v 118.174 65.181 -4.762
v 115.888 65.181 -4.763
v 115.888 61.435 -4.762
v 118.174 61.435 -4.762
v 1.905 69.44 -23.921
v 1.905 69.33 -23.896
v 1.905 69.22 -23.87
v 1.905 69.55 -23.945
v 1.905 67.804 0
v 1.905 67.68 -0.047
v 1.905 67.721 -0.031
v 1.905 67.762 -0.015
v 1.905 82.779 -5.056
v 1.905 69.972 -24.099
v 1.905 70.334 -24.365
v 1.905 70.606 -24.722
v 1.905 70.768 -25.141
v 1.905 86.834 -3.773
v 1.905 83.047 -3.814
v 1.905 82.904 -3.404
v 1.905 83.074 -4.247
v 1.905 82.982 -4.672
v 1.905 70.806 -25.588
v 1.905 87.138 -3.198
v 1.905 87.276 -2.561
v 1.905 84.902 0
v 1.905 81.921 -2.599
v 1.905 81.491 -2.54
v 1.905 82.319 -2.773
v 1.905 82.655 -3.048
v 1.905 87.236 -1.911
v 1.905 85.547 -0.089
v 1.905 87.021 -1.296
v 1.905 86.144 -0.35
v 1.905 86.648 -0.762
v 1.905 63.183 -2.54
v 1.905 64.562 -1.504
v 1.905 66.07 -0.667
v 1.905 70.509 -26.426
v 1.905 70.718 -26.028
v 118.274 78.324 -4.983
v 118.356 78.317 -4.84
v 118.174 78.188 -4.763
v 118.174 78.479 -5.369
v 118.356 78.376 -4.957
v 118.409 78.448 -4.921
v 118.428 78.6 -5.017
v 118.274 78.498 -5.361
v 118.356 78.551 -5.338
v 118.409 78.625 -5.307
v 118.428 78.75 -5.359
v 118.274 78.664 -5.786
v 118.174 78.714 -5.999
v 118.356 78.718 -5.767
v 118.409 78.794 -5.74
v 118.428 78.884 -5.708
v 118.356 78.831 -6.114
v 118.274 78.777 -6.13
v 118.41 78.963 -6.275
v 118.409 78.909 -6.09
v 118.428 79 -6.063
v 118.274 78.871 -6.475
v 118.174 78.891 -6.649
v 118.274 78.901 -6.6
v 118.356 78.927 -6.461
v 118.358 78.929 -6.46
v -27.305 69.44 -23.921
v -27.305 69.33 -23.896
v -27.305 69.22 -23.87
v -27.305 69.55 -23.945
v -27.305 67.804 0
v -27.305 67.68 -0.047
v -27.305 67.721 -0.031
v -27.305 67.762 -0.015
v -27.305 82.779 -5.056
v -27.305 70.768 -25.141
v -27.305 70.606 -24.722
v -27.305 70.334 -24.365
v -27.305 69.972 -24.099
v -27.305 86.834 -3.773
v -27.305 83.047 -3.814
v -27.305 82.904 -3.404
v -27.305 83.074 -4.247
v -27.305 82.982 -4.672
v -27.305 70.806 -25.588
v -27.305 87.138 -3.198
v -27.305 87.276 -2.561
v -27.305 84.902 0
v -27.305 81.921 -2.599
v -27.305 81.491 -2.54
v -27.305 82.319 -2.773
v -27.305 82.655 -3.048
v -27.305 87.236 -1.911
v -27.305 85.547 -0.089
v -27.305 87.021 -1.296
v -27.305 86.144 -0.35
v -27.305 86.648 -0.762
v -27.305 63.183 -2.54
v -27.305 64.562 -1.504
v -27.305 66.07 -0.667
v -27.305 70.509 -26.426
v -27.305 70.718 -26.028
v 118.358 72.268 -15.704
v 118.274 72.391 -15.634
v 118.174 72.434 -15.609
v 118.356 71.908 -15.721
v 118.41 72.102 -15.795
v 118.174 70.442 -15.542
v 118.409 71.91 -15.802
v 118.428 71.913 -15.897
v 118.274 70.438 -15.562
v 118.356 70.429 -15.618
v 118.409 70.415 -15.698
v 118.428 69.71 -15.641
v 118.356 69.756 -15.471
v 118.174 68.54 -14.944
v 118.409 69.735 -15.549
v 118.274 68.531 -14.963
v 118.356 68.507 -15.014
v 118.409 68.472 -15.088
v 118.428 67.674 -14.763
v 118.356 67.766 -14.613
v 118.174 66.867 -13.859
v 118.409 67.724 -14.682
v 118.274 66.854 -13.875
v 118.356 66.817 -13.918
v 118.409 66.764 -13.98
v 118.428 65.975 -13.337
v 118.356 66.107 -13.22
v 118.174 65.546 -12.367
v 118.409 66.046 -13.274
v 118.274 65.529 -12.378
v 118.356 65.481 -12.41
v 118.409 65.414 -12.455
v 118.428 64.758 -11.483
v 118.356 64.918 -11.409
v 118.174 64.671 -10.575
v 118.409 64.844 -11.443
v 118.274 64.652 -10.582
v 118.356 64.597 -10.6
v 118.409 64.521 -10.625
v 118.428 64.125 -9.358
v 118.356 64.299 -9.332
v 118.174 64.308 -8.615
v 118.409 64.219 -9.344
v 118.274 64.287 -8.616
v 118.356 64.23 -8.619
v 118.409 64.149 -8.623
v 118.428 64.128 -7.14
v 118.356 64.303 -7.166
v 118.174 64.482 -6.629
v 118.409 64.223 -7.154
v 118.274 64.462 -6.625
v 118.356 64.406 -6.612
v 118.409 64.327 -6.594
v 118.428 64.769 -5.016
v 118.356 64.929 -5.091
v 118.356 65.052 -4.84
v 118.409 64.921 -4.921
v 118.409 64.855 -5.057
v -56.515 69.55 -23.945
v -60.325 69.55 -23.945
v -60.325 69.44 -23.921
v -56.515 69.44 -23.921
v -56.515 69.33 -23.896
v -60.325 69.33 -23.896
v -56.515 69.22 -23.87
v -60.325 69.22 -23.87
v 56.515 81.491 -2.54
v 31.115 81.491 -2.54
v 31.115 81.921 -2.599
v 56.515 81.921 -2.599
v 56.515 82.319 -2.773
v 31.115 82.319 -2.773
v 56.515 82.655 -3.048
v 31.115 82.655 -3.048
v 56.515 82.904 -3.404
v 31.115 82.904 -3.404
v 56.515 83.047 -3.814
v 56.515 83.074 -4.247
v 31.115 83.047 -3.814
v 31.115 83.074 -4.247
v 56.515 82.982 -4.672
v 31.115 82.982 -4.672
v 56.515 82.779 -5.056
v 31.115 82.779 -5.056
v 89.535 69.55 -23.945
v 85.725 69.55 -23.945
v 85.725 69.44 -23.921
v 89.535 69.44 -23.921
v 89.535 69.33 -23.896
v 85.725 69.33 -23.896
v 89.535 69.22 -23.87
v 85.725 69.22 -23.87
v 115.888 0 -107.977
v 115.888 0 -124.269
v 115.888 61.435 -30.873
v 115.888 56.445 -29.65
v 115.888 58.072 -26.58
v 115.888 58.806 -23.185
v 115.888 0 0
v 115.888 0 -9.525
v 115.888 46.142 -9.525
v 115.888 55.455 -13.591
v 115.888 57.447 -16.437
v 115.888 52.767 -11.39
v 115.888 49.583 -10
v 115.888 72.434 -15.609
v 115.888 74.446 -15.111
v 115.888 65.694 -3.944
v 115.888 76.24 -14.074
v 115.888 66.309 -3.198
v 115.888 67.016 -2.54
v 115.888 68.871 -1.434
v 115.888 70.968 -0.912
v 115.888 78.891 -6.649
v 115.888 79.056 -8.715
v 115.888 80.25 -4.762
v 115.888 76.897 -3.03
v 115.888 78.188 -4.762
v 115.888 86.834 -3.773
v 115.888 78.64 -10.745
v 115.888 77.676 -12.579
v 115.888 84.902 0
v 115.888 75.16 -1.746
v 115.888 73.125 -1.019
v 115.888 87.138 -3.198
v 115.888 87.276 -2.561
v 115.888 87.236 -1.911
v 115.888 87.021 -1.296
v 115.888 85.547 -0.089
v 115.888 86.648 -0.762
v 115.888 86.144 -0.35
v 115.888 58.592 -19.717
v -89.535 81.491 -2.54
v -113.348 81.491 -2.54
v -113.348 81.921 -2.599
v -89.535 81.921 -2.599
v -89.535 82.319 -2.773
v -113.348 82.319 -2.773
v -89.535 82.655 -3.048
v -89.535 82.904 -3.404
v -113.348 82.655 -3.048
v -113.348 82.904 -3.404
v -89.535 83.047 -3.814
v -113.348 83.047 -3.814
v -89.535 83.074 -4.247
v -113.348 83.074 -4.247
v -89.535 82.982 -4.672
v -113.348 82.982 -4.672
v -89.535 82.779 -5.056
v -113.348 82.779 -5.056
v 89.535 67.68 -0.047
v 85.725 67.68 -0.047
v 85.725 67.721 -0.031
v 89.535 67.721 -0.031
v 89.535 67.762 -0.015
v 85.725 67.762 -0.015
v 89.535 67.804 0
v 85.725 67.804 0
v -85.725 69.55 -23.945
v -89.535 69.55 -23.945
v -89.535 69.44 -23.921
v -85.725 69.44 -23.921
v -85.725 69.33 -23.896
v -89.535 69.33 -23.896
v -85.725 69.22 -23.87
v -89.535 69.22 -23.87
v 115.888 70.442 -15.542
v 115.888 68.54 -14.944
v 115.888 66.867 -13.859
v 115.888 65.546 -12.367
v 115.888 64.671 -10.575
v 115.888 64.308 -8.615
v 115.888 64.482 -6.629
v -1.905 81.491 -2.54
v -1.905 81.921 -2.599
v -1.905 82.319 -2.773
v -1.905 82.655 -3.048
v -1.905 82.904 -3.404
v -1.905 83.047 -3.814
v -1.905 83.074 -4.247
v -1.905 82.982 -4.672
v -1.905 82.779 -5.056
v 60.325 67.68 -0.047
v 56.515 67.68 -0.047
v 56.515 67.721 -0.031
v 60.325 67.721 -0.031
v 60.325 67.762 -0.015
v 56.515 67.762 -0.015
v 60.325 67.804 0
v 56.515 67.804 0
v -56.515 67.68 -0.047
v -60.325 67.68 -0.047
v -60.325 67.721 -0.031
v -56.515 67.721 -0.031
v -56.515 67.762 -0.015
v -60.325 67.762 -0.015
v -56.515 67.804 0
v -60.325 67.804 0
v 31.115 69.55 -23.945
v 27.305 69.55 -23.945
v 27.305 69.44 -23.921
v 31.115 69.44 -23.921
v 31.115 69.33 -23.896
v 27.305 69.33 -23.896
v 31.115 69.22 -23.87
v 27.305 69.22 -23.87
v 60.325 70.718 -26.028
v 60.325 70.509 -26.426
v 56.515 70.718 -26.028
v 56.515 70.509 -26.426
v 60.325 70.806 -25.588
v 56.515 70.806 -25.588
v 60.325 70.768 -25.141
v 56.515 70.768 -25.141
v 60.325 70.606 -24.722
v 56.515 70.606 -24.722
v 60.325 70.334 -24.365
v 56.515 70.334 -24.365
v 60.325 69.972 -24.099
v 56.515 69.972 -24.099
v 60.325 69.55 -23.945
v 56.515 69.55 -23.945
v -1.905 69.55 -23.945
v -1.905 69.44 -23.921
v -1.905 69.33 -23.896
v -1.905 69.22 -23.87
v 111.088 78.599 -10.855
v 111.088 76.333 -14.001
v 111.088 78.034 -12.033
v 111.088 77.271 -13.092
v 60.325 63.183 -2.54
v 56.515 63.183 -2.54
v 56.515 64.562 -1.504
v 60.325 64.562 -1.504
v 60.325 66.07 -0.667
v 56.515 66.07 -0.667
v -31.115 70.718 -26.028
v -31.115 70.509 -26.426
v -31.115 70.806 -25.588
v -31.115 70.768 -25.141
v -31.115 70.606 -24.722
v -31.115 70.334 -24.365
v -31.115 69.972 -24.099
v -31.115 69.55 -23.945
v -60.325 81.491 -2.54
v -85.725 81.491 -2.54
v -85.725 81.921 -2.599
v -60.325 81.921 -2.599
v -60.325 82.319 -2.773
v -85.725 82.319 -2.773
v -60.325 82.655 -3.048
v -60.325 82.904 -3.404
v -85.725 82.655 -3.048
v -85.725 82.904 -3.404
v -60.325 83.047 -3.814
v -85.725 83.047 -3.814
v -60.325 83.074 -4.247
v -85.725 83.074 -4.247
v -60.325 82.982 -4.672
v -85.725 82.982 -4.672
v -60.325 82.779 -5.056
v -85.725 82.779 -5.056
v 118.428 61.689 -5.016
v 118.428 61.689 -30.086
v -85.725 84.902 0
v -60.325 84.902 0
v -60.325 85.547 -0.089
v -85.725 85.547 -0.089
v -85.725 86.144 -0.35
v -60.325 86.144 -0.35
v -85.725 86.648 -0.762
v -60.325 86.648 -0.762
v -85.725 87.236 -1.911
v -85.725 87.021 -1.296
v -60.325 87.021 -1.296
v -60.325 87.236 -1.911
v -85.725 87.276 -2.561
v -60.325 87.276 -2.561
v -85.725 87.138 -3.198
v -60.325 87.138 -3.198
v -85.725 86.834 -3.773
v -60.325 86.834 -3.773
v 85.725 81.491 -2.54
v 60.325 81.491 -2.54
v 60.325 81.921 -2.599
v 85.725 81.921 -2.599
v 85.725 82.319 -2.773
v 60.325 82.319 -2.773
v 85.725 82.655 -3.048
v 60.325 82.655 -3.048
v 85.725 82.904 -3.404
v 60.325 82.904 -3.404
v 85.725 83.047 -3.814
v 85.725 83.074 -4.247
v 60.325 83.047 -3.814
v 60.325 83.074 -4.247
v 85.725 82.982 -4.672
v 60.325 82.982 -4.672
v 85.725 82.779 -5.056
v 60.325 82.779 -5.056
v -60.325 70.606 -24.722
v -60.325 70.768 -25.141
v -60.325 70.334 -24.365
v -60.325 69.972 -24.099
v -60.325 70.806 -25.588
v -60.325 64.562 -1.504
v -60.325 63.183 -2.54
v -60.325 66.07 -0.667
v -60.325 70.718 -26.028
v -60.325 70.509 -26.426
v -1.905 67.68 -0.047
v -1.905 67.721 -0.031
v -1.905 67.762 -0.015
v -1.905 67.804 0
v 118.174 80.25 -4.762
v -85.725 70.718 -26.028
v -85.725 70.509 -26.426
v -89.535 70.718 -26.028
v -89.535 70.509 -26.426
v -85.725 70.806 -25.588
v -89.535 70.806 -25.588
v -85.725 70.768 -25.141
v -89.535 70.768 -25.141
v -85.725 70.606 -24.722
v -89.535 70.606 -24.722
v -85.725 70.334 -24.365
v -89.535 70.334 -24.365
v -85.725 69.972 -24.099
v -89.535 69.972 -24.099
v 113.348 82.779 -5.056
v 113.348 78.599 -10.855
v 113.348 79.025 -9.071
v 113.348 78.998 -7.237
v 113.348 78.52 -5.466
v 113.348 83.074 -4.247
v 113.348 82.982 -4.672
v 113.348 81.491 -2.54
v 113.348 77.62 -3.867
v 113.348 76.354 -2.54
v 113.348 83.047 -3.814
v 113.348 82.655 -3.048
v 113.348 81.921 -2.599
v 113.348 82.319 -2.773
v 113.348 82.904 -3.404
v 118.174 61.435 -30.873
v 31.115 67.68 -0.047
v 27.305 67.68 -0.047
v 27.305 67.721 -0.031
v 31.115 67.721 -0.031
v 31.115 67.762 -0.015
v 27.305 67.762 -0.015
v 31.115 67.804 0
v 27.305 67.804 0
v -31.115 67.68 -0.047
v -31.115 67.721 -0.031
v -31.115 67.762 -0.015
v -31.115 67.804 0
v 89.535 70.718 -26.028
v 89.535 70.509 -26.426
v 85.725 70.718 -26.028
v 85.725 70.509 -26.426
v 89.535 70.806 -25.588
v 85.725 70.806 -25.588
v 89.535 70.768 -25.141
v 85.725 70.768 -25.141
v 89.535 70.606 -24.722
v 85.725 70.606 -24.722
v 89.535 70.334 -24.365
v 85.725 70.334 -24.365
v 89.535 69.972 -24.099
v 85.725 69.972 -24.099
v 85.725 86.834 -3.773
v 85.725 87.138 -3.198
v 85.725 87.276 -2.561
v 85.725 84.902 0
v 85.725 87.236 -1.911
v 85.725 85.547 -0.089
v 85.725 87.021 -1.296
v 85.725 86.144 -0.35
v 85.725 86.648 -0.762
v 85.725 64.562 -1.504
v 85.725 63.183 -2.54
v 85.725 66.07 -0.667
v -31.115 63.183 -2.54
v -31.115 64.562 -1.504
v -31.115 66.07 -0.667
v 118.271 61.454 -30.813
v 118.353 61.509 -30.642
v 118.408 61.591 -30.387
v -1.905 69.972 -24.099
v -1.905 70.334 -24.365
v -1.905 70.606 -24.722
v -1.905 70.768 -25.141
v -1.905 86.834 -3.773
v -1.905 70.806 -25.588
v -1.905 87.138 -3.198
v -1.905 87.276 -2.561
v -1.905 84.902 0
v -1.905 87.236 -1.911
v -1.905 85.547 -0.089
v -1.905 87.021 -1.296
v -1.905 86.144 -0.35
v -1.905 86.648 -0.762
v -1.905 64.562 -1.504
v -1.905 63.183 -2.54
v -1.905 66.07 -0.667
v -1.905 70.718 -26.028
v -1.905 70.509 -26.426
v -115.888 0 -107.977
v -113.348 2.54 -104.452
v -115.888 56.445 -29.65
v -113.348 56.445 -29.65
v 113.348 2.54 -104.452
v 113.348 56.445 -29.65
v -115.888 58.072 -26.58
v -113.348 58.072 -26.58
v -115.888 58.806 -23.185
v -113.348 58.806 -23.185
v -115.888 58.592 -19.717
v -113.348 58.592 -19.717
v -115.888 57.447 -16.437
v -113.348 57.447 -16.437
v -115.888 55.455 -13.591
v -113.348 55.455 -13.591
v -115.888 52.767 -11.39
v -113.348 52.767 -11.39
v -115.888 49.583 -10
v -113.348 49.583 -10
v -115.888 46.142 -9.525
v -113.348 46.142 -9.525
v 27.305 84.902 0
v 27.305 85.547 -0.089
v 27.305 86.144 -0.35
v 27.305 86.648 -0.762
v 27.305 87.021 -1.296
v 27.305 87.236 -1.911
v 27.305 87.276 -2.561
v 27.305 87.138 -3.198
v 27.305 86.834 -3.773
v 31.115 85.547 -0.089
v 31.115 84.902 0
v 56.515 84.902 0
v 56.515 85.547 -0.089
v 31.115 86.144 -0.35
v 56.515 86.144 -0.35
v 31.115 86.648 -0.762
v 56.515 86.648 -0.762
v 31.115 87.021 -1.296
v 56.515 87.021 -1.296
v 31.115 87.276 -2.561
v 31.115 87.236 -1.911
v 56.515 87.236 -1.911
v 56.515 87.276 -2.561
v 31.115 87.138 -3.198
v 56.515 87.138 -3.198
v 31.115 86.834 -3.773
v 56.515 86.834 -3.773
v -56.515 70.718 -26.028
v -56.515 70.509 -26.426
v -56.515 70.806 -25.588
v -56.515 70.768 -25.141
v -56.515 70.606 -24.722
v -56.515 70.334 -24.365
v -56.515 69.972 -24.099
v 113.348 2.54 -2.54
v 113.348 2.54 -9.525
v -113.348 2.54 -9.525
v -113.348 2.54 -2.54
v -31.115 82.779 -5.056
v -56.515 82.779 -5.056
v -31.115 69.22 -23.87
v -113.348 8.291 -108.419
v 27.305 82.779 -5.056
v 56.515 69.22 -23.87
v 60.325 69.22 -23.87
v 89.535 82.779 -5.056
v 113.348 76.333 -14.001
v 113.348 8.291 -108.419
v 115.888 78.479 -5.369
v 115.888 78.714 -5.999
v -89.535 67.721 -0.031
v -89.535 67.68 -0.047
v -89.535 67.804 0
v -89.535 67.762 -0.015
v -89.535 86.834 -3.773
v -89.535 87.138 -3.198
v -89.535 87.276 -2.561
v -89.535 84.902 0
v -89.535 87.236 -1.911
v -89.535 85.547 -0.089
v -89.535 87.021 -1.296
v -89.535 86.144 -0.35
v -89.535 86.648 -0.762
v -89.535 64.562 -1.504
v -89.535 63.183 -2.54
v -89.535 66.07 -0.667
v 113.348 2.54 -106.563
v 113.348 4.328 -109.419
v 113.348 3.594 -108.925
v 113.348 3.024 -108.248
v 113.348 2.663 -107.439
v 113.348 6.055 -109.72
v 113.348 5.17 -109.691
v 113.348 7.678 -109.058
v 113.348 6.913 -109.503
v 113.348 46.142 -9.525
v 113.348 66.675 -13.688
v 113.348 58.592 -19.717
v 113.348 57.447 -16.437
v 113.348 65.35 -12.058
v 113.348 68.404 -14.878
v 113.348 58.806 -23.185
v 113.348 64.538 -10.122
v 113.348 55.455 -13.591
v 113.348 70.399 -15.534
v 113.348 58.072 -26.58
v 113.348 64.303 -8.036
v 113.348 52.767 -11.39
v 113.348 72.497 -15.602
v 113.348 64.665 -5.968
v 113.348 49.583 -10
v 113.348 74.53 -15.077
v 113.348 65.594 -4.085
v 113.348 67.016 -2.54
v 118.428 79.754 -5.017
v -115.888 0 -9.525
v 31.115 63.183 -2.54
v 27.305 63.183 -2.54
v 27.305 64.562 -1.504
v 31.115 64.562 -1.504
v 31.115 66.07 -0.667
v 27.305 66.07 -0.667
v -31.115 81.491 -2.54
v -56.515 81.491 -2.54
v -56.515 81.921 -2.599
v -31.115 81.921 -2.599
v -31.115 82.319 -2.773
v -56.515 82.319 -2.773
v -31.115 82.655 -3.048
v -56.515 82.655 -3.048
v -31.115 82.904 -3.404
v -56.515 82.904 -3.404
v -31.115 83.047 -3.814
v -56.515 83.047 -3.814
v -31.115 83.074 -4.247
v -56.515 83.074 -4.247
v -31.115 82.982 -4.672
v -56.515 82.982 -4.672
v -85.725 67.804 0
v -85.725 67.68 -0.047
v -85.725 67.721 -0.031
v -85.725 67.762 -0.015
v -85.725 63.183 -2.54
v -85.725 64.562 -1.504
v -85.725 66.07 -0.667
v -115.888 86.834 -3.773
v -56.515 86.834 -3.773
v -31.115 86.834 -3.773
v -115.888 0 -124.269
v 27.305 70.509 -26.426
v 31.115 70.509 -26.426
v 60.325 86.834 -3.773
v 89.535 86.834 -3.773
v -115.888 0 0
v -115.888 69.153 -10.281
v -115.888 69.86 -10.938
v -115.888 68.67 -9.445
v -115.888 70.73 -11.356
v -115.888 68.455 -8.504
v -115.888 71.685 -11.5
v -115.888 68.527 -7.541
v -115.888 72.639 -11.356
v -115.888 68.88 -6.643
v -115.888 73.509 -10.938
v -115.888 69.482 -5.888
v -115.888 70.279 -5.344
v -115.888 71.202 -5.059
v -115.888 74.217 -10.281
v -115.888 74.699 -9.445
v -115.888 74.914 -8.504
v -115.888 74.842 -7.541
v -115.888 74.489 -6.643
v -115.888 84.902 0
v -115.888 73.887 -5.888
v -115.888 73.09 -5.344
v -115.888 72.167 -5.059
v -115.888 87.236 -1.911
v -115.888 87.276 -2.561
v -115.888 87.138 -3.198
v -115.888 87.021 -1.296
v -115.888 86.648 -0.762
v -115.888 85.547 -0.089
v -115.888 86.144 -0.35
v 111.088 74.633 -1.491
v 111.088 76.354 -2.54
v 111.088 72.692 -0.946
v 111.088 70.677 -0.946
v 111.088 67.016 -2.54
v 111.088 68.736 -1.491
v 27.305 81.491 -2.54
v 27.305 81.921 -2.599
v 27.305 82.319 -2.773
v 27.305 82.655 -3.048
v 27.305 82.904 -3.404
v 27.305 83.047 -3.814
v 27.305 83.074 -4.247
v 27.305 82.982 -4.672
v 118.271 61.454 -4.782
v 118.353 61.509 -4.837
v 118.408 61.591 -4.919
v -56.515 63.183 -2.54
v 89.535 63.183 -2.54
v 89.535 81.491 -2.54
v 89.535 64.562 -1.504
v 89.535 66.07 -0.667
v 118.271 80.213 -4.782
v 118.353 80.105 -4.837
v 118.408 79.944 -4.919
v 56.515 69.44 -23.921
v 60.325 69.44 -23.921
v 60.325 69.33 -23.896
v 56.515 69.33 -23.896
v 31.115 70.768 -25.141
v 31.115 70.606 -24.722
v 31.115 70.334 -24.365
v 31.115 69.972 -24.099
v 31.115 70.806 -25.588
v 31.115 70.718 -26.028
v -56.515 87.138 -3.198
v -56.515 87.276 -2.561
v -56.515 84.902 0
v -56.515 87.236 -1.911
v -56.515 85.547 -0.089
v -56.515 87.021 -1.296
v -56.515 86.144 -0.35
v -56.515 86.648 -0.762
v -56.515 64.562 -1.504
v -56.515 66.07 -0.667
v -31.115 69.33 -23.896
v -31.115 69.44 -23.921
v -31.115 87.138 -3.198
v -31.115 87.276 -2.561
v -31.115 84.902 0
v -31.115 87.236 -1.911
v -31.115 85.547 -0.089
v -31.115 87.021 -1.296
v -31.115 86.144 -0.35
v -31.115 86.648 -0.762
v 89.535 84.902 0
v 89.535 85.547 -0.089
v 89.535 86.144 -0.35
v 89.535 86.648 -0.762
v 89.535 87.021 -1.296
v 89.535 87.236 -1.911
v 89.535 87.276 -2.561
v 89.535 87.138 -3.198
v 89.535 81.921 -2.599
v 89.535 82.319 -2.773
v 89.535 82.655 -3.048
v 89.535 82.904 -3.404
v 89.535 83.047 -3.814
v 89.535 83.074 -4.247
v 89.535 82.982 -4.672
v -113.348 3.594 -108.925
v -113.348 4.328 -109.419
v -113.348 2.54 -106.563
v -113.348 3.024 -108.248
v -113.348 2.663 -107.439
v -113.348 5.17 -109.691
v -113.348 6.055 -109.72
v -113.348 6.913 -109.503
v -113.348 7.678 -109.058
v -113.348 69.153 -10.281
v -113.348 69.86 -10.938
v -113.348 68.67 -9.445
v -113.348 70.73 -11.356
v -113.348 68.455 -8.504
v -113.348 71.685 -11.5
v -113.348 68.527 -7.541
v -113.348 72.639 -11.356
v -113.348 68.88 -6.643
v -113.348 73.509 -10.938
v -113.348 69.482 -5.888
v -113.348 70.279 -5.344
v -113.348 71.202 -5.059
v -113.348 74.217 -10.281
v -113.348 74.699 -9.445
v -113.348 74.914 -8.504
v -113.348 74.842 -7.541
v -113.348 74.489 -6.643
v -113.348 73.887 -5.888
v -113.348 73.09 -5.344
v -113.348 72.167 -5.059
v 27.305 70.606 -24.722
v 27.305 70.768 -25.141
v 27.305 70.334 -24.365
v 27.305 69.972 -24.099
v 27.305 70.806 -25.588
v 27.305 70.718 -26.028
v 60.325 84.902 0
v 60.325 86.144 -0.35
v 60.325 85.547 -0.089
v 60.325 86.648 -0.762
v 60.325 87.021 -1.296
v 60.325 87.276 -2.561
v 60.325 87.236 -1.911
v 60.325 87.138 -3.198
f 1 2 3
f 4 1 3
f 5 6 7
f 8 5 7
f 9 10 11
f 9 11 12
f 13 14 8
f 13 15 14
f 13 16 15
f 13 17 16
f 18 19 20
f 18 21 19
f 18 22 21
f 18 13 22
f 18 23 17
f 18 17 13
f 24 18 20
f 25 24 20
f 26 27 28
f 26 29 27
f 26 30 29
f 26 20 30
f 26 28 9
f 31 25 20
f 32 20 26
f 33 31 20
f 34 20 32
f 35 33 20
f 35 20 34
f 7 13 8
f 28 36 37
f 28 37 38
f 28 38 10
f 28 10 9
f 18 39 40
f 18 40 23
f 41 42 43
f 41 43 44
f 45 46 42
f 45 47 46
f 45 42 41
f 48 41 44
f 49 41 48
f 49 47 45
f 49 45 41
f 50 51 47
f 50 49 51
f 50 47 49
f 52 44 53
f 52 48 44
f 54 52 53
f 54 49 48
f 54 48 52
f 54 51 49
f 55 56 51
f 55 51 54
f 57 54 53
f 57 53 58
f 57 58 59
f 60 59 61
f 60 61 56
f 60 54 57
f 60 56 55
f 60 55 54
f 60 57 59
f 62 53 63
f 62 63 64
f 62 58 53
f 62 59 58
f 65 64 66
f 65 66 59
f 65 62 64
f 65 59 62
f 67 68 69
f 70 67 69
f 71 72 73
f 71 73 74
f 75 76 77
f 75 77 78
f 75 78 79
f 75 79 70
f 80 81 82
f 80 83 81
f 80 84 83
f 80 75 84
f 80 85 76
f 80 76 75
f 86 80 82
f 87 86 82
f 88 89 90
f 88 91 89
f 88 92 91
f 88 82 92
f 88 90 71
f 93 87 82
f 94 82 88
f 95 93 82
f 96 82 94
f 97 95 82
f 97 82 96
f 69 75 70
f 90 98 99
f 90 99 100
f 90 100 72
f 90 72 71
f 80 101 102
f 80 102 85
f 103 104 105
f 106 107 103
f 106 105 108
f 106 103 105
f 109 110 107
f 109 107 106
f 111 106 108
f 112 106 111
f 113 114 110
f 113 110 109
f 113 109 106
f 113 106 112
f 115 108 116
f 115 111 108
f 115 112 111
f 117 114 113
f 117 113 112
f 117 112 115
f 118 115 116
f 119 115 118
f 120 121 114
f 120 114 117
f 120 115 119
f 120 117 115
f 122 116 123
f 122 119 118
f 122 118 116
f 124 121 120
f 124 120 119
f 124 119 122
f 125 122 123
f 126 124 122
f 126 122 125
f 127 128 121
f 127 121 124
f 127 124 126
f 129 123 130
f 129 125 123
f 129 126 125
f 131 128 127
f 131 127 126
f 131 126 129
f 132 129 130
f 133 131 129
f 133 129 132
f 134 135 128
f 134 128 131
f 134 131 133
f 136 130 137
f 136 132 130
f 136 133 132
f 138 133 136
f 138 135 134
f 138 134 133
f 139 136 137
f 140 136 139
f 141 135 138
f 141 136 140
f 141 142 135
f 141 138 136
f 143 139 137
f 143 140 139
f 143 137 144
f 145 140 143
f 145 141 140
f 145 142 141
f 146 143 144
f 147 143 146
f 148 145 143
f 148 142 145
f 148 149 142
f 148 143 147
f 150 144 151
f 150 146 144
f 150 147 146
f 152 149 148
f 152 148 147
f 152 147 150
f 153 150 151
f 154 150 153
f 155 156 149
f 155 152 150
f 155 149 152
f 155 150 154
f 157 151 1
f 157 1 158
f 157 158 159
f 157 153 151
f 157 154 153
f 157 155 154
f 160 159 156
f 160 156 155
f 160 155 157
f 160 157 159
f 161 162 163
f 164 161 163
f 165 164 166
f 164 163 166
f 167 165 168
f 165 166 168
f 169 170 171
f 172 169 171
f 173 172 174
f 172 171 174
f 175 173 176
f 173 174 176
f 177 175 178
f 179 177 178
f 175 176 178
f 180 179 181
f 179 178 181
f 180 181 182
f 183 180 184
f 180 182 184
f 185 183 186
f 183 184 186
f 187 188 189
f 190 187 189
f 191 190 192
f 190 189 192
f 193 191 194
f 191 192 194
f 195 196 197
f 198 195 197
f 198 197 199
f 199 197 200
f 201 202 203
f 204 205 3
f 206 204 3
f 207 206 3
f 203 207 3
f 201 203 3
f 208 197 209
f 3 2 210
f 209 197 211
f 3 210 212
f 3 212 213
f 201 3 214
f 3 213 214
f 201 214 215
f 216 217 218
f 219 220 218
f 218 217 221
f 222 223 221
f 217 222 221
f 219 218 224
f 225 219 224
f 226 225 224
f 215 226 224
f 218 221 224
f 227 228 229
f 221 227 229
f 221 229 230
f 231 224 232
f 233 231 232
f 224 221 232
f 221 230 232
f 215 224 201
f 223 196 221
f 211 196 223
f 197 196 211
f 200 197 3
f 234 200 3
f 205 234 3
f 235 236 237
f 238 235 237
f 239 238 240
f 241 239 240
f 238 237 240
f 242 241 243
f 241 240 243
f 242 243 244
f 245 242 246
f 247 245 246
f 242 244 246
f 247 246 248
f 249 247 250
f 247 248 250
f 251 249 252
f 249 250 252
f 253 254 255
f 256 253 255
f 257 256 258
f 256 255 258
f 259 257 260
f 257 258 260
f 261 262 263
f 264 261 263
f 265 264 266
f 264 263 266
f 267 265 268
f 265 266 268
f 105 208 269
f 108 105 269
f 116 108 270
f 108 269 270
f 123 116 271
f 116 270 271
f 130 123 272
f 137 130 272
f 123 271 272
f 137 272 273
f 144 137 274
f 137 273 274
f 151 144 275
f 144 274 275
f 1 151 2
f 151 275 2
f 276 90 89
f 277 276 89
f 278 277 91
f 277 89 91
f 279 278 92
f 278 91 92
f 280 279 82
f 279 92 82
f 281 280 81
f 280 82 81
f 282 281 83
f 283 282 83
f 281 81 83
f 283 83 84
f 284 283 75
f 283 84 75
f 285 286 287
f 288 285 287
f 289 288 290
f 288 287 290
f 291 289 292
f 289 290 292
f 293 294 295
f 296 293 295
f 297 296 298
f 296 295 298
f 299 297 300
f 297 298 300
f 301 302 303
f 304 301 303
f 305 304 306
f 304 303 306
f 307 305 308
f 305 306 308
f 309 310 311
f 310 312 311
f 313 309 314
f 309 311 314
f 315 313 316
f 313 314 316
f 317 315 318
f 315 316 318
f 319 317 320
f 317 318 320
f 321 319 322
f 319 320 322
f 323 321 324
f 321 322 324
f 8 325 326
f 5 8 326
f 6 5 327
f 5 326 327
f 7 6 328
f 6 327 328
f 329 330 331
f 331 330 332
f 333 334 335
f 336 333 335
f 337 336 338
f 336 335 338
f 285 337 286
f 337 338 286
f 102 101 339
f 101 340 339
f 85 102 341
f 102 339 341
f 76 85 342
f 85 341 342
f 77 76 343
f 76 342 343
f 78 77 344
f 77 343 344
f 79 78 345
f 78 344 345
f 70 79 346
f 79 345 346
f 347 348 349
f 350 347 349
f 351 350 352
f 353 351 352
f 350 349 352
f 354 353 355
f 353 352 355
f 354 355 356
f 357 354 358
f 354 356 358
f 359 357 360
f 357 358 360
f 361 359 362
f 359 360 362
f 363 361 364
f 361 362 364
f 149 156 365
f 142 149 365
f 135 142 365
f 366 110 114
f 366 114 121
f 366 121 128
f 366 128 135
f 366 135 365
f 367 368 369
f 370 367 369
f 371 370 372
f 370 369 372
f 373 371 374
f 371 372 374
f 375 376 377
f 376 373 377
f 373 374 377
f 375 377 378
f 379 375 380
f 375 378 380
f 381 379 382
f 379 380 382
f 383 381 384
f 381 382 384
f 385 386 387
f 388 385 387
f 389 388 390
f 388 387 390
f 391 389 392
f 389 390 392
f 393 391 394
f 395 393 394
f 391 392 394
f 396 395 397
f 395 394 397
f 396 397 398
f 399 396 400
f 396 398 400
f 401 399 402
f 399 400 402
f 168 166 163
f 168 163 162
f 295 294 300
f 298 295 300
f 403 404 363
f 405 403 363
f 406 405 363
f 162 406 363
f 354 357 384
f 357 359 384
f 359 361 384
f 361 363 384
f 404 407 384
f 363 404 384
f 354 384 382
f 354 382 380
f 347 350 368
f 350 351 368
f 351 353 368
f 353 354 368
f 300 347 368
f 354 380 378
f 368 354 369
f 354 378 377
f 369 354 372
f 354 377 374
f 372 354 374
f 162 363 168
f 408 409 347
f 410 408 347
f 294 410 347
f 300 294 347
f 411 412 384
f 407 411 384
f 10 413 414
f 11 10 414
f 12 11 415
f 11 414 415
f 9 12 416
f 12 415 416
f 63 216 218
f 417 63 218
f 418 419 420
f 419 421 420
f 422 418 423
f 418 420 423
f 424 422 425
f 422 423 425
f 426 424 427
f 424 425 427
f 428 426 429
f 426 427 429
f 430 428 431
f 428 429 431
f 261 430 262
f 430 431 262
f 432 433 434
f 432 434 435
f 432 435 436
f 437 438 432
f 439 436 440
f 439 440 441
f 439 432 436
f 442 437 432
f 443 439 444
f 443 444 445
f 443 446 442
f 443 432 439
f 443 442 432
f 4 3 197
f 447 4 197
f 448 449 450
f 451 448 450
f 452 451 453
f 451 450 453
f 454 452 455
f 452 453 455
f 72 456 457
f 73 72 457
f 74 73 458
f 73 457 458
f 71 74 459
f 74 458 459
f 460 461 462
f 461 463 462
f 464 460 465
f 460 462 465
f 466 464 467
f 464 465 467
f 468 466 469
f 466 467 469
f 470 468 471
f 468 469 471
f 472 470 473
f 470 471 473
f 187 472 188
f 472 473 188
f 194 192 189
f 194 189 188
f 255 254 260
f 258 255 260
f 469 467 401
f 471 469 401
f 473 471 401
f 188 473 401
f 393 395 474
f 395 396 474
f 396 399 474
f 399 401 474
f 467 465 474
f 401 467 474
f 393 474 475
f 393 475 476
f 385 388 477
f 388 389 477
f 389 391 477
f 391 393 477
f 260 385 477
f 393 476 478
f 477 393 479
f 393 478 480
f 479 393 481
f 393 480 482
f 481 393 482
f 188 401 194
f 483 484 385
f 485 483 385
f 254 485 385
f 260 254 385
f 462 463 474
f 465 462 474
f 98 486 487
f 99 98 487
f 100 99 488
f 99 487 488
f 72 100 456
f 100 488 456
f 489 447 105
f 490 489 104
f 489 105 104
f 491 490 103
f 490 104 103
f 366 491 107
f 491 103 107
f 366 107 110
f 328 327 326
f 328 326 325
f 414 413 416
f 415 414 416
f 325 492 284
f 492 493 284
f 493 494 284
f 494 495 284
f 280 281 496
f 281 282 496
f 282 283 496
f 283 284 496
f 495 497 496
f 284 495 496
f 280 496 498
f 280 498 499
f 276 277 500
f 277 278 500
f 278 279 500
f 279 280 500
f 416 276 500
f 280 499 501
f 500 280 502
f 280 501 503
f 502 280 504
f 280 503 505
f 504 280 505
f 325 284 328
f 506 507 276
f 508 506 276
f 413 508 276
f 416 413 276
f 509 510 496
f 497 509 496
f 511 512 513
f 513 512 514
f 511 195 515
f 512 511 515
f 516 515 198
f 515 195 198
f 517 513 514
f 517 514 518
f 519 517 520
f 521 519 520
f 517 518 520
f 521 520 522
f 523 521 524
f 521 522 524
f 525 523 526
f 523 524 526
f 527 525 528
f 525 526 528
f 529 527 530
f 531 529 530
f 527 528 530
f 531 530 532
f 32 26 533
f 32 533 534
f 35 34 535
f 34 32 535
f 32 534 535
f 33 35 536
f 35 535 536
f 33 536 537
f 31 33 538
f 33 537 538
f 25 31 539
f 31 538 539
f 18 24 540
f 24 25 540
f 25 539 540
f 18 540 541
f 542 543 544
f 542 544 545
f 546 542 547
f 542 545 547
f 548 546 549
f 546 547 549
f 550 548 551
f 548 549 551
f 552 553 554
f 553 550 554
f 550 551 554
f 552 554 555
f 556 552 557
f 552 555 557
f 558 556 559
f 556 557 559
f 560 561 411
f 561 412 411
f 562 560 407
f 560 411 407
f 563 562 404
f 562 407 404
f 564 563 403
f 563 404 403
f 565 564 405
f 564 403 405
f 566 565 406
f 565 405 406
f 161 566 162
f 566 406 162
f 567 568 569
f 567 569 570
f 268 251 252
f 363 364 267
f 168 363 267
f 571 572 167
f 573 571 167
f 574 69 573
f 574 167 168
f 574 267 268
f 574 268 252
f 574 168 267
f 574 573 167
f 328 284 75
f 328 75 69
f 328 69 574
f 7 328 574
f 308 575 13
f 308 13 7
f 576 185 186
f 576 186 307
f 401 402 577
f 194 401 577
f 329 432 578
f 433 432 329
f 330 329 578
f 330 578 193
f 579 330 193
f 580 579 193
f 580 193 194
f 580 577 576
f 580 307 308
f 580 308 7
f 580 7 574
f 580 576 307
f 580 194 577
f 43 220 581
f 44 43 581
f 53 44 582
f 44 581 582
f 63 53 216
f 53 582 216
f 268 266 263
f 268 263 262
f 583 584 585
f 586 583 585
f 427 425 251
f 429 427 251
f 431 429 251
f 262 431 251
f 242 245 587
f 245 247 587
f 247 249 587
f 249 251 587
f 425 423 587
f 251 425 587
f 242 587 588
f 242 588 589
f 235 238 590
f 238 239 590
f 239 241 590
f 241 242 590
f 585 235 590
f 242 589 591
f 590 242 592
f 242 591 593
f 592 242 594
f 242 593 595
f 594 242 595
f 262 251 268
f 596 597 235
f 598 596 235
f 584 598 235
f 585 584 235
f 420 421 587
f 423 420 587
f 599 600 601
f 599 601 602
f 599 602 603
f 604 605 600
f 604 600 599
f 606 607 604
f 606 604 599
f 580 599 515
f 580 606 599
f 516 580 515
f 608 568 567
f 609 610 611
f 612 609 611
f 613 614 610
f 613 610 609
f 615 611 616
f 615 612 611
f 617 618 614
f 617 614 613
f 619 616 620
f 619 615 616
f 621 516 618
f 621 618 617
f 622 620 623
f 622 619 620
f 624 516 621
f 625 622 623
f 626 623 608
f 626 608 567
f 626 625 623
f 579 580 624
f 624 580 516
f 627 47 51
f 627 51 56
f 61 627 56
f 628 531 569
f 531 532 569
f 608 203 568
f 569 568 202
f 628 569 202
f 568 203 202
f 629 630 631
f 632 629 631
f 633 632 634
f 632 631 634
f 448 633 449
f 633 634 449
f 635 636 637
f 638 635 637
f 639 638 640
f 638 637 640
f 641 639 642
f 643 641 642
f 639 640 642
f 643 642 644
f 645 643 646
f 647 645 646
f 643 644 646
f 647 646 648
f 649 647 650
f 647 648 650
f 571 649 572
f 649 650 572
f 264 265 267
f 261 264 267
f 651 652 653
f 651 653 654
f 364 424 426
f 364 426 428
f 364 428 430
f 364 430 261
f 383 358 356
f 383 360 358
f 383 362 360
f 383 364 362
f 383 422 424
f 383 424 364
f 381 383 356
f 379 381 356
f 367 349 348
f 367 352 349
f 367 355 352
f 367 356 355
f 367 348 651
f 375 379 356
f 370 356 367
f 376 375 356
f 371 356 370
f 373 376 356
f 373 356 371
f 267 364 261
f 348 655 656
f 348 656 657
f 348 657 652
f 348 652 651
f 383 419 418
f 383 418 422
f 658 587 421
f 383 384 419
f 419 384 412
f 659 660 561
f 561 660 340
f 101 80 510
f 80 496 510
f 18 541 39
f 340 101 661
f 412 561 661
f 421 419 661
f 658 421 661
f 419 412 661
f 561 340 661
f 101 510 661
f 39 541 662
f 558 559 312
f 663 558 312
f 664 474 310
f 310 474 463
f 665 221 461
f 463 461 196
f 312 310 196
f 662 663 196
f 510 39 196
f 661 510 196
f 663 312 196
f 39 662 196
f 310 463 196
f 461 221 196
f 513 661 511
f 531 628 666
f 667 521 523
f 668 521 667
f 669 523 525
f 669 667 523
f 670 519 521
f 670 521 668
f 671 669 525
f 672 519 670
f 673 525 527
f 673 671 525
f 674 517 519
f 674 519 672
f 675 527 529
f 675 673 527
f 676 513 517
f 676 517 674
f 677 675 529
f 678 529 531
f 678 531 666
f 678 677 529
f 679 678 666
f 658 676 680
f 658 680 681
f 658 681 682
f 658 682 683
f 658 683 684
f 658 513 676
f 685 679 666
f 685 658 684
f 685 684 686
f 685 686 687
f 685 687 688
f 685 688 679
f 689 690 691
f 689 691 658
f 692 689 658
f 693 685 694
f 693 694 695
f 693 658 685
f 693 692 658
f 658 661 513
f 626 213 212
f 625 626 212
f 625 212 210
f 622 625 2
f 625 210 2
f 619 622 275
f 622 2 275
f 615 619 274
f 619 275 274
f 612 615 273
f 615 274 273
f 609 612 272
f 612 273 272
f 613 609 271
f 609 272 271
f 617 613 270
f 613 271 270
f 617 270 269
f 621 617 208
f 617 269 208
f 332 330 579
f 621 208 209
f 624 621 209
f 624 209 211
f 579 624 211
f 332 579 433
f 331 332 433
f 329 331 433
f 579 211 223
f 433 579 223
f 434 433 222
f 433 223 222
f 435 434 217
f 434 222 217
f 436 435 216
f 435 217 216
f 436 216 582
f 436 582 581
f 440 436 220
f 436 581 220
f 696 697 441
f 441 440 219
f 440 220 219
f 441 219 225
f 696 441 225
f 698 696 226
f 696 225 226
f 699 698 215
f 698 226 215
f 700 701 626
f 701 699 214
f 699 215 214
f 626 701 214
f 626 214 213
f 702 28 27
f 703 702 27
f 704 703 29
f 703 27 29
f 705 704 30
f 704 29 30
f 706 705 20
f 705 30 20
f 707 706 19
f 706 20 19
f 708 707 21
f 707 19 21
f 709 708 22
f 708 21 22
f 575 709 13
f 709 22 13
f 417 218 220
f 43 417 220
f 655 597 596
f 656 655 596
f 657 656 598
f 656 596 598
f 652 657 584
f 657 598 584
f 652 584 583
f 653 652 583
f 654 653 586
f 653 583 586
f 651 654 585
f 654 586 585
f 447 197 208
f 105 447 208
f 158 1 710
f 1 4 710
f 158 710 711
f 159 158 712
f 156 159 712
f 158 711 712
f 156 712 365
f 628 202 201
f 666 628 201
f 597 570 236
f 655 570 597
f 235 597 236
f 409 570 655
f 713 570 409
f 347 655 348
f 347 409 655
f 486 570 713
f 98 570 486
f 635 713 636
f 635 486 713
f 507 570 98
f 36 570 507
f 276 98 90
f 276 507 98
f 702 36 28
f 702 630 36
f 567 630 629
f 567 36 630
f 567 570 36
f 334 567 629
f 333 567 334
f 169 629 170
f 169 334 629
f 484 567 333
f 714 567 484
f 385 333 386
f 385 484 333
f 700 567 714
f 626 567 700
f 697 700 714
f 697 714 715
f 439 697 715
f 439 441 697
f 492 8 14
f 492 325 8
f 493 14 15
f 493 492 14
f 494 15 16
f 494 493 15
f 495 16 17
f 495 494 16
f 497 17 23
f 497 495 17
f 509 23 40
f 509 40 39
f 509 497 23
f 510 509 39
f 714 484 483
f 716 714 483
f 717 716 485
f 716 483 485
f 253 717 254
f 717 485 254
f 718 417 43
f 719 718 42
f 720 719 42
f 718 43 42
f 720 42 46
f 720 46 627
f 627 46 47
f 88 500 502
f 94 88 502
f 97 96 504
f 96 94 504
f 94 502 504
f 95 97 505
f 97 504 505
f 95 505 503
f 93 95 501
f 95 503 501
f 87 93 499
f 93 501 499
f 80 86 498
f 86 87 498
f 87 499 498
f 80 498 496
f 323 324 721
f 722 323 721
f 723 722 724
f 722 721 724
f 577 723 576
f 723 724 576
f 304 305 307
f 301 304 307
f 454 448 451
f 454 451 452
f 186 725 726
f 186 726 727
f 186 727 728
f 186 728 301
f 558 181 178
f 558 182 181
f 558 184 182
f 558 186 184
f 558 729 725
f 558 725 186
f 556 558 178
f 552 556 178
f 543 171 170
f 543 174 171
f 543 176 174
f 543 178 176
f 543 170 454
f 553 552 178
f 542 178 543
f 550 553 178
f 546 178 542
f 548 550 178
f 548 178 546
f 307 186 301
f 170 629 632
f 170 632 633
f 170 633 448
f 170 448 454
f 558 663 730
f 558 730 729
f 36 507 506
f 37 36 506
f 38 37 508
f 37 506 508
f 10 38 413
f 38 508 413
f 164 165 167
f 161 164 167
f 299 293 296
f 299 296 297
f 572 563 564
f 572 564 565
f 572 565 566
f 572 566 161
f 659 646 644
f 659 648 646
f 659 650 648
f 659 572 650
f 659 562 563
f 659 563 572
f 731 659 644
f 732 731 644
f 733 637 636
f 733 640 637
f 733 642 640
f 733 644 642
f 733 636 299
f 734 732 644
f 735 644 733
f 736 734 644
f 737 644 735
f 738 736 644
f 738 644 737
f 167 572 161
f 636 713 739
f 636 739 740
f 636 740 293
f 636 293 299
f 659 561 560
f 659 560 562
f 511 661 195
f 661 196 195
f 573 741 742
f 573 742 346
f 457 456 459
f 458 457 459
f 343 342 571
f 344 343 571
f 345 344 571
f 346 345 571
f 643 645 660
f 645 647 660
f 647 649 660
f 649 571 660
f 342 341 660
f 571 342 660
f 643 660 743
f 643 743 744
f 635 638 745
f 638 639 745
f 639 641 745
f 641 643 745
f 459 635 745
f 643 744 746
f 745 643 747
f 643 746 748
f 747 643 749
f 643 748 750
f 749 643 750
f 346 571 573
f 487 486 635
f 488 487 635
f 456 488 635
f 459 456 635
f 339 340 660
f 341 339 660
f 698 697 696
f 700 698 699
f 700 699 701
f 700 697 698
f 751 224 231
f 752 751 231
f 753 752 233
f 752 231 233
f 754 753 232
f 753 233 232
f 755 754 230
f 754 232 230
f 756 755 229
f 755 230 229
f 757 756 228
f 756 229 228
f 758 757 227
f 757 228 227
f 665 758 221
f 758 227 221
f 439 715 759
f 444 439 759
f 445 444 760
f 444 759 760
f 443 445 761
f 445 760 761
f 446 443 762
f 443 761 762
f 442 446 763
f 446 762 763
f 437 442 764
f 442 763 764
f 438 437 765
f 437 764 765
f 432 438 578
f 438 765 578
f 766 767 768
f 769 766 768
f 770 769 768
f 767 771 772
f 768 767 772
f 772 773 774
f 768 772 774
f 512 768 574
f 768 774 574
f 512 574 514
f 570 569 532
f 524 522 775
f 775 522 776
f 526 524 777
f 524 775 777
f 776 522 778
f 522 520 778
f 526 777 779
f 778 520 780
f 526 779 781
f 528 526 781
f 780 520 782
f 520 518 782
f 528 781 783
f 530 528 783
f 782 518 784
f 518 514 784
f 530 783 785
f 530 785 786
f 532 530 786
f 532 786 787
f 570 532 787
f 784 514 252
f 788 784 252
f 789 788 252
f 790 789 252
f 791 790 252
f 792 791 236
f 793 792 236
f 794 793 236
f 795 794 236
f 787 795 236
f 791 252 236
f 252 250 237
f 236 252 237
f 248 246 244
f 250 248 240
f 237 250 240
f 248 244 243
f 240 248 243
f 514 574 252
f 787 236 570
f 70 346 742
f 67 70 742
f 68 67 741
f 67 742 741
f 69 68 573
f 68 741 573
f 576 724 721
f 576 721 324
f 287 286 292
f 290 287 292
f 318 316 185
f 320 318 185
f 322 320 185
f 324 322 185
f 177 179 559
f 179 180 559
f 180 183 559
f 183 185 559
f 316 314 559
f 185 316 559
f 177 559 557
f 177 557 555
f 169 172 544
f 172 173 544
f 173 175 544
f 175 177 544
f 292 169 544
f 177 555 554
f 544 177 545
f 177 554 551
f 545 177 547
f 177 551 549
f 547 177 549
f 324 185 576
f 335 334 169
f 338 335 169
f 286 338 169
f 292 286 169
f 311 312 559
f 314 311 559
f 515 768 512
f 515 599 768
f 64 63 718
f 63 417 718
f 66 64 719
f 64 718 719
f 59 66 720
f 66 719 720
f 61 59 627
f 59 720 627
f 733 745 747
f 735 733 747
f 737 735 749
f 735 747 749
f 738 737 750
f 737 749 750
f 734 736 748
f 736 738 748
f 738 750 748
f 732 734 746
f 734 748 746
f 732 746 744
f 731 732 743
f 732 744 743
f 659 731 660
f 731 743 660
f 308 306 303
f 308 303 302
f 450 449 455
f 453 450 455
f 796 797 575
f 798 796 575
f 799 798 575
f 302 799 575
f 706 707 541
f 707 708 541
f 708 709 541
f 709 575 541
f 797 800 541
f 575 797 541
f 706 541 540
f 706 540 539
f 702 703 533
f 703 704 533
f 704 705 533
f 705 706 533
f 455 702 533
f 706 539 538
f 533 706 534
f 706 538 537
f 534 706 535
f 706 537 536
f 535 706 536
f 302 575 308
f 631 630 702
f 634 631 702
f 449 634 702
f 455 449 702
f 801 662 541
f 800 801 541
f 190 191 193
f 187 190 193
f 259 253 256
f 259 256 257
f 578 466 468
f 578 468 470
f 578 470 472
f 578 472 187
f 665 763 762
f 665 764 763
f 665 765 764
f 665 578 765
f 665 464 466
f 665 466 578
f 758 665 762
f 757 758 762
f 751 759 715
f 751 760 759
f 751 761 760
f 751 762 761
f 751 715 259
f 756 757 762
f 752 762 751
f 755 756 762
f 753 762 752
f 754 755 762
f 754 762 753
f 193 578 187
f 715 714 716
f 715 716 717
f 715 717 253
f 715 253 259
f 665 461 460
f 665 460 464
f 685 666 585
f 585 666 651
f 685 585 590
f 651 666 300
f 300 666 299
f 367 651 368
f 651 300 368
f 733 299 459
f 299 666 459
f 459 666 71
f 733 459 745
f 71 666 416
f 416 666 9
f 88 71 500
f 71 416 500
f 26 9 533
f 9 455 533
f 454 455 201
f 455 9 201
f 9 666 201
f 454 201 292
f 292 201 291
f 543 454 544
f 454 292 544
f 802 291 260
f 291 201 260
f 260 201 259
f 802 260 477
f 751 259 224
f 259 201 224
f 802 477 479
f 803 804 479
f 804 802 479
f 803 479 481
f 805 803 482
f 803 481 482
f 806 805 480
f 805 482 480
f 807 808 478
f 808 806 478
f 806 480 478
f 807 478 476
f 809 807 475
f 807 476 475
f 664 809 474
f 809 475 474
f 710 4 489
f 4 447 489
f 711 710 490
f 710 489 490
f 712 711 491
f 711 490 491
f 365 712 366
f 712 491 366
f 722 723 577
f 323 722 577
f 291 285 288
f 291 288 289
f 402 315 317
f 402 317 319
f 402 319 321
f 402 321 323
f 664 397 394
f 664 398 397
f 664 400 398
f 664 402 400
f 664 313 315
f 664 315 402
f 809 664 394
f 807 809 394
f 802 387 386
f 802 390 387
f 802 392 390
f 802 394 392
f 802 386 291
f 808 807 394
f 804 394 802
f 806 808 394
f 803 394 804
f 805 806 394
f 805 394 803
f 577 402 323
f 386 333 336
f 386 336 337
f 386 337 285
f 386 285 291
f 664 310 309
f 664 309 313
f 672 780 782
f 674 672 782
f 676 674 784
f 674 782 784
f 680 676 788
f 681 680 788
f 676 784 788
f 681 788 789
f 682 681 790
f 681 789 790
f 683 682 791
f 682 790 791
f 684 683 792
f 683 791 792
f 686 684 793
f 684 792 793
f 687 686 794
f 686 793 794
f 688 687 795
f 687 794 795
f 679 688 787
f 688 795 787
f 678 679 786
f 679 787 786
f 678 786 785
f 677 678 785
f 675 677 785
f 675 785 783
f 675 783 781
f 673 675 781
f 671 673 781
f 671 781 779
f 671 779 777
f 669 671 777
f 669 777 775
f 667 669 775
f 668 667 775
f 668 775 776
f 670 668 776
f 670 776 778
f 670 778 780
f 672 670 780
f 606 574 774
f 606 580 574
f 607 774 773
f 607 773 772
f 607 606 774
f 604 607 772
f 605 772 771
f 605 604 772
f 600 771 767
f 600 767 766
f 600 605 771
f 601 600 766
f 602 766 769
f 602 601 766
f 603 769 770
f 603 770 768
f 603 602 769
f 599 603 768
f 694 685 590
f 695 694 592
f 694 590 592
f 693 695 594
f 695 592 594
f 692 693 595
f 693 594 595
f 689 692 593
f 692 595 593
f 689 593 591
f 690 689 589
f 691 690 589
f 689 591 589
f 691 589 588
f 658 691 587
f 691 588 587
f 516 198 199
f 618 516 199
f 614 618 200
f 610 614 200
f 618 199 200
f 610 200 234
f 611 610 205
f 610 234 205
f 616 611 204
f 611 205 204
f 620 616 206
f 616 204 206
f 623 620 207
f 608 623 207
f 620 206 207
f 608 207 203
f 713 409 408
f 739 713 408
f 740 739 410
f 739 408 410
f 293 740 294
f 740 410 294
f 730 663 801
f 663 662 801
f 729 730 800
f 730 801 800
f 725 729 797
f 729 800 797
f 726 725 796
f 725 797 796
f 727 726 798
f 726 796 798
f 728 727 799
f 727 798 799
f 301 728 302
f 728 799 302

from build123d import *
from build123d.topology import SkipClean

# Parameters (mm, degrees)
BOSS_EXTRUDE1_DEPTH    = 115.8875
SHELL1_T               = -2.54
FILLET7_R              = 1.5875
FILLET6_R              = 3.175
CUT_EXTRUDE1_DEPTH     = 1.905
FILLET8_R              = 1.5875
LPATTERN1_COUNT        = 4
LPATTERN1_PITCH        = 29.21
FILLET8_OF_LPATTERN1_R = 1.5875
LPATTERN2_COUNT        = 4
LPATTERN2_PITCH        = 29.21
FILLET8_OF_LPATTERN2_R = 1.5875
BOSS_EXTRUDE2_DEPTH    = 2.54
SKETCH5_R              = 7.385
CUT_EXTRUDE2_DEPTH     = 4.8
FILLET4_R              = 0.254
FILLET5_R              = 0.254
SKETCH6_R              = 3.2385
CUT_EXTRUDE3_DEPTH     = 278.093208583


with BuildPart() as part:
    # Sketch1 → Boss-Extrude1 (new, symmetric)
    with BuildSketch(Plane(origin=(0, 0, 0), x_dir=(0, 0, -1), z_dir=(1, 0, 0))):
        with BuildLine():
            Line((0, 0), (0, 84.901644013))
            ThreePointArc((0, 84.901644013), (1.29607654, 87.021254856), (3.773438424, 86.833524691))
            Line((3.773438424, 86.833524691), (124.268628317, 0))
            Line((124.268628317, 0), (107.976719942, 0))
            Line((107.976719942, 0), (29.650004929, 56.445280082))
            ThreePointArc((29.650004929, 56.445280082), (16.437408213, 57.446507626), (9.525, 46.141916466))
            Line((9.525, 46.141916466), (9.525, 0))
            Line((9.525, 0), (0, 0))
        make_face()
    extrude(amount=BOSS_EXTRUDE1_DEPTH, both=True)

    # Shell1
    shell1_openings = [part.faces().sort_by_distance(p)[0] for p in [
        (0, 28.222640041, -68.813362436),
        (0, 57.446507626, -16.437408213),
        (0, 23.070958233, -9.525),
    ]]
    offset(amount=SHELL1_T, openings=shell1_openings, kind=Kind.INTERSECTION)

    # Fillet7
    fillet7_edges = [part.edges().sort_by_distance(p)[0] for p in [
        (0, 84.591566193, -2.54),
    ]]
    fillet(fillet7_edges, radius=FILLET7_R)

    # Fillet6
    fillet6_edges = [part.edges().sort_by_distance(p)[0] for p in [
        (0, 2.54, -116.399469423),
    ]]
    fillet(fillet6_edges, radius=FILLET6_R)

    # Sketch3 → Cut-Extrude1 (cut, symmetric)
    with BuildSketch(Plane(origin=(0, -2.413, -15.875), x_dir=(0, 0, 1), z_dir=(-1, 0, 0))):
        with BuildLine():
            Line((-7.926699104, 71.361902399), (-8.271161087, 70.883874176))
            ThreePointArc((-8.271161087, 70.883874176), (3.476459724, 61.284711128), (15.828327064, 70.09276989))
            ThreePointArc((15.828327064, 70.09276989), (15.901291869, 70.288577921), (15.970972384, 70.485578616))
            Line((15.970972384, 70.485578616), (17.531294258, 75.017082374))
            Line((17.531294258, 75.017082374), (17.531294258, 94.003784079))
            Line((17.531294258, 94.003784079), (-8.281098949, 75.779023692))
            ThreePointArc((-8.281098949, 75.779023692), (-8.301253168, 73.554628688), (-7.926699104, 71.361902399))
        make_face()
    cut_extrude1 = extrude(amount=CUT_EXTRUDE1_DEPTH, both=True, mode=Mode.SUBTRACT)

    # Fillet8
    fillet8_edges = [part.edges().sort_by_distance(p)[0] for p in [
        (0, 72.101660209, -24.21622034),
    ]]
    fillet(fillet8_edges, radius=FILLET8_R)

    # LPattern1: Cut-Extrude1 ×4
    with Locations(*[(i * LPATTERN1_PITCH, 0, 0) for i in range(1, LPATTERN1_COUNT)]):
        add(cut_extrude1, mode=Mode.SUBTRACT)

    # Fillet8 of LPattern1
    fillet8_of_lpattern1_edges = [part.edges().sort_by_distance(p)[0] for p in [
        (29.21, 72.101660209, -24.21622034),
        (58.42, 72.101660209, -24.21622034),
        (87.63, 72.101660209, -24.21622034),
    ]]
    fillet(fillet8_of_lpattern1_edges, radius=FILLET8_OF_LPATTERN1_R)

    # LPattern2: Cut-Extrude1 ×4
    with Locations(*[(-i * LPATTERN2_PITCH, 0, 0) for i in range(1, LPATTERN2_COUNT)]):
        add(cut_extrude1, mode=Mode.SUBTRACT)

    # Fillet8 of LPattern2
    fillet8_of_lpattern2_edges = [part.edges().sort_by_distance(p)[0] for p in [
        (-29.21, 72.101660209, -24.21622034),
        (-58.42, 72.101660209, -24.21622034),
        (-87.63, 72.101660209, -24.21622034),
    ]]
    fillet(fillet8_of_lpattern2_edges, radius=FILLET8_OF_LPATTERN2_R)

    # Sketch4 → Boss-Extrude2 (add)
    with BuildSketch(Plane(origin=(115.8875, 0, 0), x_dir=(0, 0, -1), z_dir=(1, 0, 0))):
        with BuildLine():
            Line((4.7625, 80.250476708), (4.7625, 78.187860591))
            ThreePointArc((4.7625, 78.187860591), (5.681515336, 78.604108973), (6.648686934, 78.891216974))
            Line((6.648686934, 78.891216974), (4.7625, 80.250476708))
        make_face()
        with BuildLine():
            Line((30.872562622, 61.434549123), (15.608650064, 72.434318733))
            ThreePointArc((15.608650064, 72.434318733), (12.367009719, 65.545693058), (4.7625, 65.181237654))
            Line((4.7625, 65.181237654), (4.7625, 61.434549123))
            Line((4.7625, 61.434549123), (30.872562622, 61.434549123))
        make_face()
    extrude(amount=BOSS_EXTRUDE2_DEPTH)

    # Sketch5 → Cut-Extrude2 (cut)
    with SkipClean():  # the faces are left unmerged after this step: merging them gives an invalid solid
        with BuildSketch(Plane(origin=(115.8875, 0, 0), x_dir=(0, 0, -1), z_dir=(1, 0, 0))):
            with Locations(Location((8.26180921, 71.684549123, 0), (0, 0, 219.214186209))):
                Circle(SKETCH5_R)
        extrude(amount=-CUT_EXTRUDE2_DEPTH, mode=Mode.SUBTRACT)

    # Fillet4
    fillet4_edges = [part.edges().sort_by_distance(p)[0] for p in [
        (118.4275, 79.570846841, -5.705593467),
        (118.4275, 79.219168649, -4.7625),
        (118.4275, 78.604108973, -5.681515336),
    ]]
    fillet(fillet4_edges, radius=FILLET4_R)

    # Fillet5
    fillet5_edges = [part.edges().sort_by_distance(p)[0] for p in [
        (118.4275, 61.434549123, -17.817531311),
        (118.4275, 66.934433928, -23.240606343),
        (118.4275, 65.545693058, -12.367009719),
        (118.4275, 63.307893389, -4.7625),
    ]]
    fillet(fillet5_edges, radius=FILLET5_R)

    # Sketch6 → Cut-Extrude3 (cut, through all)
    with BuildSketch(Plane(origin=(-113.3475, 0, 0), x_dir=(0, 0, -1), z_dir=(1, 0, 0))):
        with Locations((8.26180921, 71.684549123)):
            Circle(SKETCH6_R)
    extrude(amount=-CUT_EXTRUDE3_DEPTH, mode=Mode.SUBTRACT)


solid = part.part
